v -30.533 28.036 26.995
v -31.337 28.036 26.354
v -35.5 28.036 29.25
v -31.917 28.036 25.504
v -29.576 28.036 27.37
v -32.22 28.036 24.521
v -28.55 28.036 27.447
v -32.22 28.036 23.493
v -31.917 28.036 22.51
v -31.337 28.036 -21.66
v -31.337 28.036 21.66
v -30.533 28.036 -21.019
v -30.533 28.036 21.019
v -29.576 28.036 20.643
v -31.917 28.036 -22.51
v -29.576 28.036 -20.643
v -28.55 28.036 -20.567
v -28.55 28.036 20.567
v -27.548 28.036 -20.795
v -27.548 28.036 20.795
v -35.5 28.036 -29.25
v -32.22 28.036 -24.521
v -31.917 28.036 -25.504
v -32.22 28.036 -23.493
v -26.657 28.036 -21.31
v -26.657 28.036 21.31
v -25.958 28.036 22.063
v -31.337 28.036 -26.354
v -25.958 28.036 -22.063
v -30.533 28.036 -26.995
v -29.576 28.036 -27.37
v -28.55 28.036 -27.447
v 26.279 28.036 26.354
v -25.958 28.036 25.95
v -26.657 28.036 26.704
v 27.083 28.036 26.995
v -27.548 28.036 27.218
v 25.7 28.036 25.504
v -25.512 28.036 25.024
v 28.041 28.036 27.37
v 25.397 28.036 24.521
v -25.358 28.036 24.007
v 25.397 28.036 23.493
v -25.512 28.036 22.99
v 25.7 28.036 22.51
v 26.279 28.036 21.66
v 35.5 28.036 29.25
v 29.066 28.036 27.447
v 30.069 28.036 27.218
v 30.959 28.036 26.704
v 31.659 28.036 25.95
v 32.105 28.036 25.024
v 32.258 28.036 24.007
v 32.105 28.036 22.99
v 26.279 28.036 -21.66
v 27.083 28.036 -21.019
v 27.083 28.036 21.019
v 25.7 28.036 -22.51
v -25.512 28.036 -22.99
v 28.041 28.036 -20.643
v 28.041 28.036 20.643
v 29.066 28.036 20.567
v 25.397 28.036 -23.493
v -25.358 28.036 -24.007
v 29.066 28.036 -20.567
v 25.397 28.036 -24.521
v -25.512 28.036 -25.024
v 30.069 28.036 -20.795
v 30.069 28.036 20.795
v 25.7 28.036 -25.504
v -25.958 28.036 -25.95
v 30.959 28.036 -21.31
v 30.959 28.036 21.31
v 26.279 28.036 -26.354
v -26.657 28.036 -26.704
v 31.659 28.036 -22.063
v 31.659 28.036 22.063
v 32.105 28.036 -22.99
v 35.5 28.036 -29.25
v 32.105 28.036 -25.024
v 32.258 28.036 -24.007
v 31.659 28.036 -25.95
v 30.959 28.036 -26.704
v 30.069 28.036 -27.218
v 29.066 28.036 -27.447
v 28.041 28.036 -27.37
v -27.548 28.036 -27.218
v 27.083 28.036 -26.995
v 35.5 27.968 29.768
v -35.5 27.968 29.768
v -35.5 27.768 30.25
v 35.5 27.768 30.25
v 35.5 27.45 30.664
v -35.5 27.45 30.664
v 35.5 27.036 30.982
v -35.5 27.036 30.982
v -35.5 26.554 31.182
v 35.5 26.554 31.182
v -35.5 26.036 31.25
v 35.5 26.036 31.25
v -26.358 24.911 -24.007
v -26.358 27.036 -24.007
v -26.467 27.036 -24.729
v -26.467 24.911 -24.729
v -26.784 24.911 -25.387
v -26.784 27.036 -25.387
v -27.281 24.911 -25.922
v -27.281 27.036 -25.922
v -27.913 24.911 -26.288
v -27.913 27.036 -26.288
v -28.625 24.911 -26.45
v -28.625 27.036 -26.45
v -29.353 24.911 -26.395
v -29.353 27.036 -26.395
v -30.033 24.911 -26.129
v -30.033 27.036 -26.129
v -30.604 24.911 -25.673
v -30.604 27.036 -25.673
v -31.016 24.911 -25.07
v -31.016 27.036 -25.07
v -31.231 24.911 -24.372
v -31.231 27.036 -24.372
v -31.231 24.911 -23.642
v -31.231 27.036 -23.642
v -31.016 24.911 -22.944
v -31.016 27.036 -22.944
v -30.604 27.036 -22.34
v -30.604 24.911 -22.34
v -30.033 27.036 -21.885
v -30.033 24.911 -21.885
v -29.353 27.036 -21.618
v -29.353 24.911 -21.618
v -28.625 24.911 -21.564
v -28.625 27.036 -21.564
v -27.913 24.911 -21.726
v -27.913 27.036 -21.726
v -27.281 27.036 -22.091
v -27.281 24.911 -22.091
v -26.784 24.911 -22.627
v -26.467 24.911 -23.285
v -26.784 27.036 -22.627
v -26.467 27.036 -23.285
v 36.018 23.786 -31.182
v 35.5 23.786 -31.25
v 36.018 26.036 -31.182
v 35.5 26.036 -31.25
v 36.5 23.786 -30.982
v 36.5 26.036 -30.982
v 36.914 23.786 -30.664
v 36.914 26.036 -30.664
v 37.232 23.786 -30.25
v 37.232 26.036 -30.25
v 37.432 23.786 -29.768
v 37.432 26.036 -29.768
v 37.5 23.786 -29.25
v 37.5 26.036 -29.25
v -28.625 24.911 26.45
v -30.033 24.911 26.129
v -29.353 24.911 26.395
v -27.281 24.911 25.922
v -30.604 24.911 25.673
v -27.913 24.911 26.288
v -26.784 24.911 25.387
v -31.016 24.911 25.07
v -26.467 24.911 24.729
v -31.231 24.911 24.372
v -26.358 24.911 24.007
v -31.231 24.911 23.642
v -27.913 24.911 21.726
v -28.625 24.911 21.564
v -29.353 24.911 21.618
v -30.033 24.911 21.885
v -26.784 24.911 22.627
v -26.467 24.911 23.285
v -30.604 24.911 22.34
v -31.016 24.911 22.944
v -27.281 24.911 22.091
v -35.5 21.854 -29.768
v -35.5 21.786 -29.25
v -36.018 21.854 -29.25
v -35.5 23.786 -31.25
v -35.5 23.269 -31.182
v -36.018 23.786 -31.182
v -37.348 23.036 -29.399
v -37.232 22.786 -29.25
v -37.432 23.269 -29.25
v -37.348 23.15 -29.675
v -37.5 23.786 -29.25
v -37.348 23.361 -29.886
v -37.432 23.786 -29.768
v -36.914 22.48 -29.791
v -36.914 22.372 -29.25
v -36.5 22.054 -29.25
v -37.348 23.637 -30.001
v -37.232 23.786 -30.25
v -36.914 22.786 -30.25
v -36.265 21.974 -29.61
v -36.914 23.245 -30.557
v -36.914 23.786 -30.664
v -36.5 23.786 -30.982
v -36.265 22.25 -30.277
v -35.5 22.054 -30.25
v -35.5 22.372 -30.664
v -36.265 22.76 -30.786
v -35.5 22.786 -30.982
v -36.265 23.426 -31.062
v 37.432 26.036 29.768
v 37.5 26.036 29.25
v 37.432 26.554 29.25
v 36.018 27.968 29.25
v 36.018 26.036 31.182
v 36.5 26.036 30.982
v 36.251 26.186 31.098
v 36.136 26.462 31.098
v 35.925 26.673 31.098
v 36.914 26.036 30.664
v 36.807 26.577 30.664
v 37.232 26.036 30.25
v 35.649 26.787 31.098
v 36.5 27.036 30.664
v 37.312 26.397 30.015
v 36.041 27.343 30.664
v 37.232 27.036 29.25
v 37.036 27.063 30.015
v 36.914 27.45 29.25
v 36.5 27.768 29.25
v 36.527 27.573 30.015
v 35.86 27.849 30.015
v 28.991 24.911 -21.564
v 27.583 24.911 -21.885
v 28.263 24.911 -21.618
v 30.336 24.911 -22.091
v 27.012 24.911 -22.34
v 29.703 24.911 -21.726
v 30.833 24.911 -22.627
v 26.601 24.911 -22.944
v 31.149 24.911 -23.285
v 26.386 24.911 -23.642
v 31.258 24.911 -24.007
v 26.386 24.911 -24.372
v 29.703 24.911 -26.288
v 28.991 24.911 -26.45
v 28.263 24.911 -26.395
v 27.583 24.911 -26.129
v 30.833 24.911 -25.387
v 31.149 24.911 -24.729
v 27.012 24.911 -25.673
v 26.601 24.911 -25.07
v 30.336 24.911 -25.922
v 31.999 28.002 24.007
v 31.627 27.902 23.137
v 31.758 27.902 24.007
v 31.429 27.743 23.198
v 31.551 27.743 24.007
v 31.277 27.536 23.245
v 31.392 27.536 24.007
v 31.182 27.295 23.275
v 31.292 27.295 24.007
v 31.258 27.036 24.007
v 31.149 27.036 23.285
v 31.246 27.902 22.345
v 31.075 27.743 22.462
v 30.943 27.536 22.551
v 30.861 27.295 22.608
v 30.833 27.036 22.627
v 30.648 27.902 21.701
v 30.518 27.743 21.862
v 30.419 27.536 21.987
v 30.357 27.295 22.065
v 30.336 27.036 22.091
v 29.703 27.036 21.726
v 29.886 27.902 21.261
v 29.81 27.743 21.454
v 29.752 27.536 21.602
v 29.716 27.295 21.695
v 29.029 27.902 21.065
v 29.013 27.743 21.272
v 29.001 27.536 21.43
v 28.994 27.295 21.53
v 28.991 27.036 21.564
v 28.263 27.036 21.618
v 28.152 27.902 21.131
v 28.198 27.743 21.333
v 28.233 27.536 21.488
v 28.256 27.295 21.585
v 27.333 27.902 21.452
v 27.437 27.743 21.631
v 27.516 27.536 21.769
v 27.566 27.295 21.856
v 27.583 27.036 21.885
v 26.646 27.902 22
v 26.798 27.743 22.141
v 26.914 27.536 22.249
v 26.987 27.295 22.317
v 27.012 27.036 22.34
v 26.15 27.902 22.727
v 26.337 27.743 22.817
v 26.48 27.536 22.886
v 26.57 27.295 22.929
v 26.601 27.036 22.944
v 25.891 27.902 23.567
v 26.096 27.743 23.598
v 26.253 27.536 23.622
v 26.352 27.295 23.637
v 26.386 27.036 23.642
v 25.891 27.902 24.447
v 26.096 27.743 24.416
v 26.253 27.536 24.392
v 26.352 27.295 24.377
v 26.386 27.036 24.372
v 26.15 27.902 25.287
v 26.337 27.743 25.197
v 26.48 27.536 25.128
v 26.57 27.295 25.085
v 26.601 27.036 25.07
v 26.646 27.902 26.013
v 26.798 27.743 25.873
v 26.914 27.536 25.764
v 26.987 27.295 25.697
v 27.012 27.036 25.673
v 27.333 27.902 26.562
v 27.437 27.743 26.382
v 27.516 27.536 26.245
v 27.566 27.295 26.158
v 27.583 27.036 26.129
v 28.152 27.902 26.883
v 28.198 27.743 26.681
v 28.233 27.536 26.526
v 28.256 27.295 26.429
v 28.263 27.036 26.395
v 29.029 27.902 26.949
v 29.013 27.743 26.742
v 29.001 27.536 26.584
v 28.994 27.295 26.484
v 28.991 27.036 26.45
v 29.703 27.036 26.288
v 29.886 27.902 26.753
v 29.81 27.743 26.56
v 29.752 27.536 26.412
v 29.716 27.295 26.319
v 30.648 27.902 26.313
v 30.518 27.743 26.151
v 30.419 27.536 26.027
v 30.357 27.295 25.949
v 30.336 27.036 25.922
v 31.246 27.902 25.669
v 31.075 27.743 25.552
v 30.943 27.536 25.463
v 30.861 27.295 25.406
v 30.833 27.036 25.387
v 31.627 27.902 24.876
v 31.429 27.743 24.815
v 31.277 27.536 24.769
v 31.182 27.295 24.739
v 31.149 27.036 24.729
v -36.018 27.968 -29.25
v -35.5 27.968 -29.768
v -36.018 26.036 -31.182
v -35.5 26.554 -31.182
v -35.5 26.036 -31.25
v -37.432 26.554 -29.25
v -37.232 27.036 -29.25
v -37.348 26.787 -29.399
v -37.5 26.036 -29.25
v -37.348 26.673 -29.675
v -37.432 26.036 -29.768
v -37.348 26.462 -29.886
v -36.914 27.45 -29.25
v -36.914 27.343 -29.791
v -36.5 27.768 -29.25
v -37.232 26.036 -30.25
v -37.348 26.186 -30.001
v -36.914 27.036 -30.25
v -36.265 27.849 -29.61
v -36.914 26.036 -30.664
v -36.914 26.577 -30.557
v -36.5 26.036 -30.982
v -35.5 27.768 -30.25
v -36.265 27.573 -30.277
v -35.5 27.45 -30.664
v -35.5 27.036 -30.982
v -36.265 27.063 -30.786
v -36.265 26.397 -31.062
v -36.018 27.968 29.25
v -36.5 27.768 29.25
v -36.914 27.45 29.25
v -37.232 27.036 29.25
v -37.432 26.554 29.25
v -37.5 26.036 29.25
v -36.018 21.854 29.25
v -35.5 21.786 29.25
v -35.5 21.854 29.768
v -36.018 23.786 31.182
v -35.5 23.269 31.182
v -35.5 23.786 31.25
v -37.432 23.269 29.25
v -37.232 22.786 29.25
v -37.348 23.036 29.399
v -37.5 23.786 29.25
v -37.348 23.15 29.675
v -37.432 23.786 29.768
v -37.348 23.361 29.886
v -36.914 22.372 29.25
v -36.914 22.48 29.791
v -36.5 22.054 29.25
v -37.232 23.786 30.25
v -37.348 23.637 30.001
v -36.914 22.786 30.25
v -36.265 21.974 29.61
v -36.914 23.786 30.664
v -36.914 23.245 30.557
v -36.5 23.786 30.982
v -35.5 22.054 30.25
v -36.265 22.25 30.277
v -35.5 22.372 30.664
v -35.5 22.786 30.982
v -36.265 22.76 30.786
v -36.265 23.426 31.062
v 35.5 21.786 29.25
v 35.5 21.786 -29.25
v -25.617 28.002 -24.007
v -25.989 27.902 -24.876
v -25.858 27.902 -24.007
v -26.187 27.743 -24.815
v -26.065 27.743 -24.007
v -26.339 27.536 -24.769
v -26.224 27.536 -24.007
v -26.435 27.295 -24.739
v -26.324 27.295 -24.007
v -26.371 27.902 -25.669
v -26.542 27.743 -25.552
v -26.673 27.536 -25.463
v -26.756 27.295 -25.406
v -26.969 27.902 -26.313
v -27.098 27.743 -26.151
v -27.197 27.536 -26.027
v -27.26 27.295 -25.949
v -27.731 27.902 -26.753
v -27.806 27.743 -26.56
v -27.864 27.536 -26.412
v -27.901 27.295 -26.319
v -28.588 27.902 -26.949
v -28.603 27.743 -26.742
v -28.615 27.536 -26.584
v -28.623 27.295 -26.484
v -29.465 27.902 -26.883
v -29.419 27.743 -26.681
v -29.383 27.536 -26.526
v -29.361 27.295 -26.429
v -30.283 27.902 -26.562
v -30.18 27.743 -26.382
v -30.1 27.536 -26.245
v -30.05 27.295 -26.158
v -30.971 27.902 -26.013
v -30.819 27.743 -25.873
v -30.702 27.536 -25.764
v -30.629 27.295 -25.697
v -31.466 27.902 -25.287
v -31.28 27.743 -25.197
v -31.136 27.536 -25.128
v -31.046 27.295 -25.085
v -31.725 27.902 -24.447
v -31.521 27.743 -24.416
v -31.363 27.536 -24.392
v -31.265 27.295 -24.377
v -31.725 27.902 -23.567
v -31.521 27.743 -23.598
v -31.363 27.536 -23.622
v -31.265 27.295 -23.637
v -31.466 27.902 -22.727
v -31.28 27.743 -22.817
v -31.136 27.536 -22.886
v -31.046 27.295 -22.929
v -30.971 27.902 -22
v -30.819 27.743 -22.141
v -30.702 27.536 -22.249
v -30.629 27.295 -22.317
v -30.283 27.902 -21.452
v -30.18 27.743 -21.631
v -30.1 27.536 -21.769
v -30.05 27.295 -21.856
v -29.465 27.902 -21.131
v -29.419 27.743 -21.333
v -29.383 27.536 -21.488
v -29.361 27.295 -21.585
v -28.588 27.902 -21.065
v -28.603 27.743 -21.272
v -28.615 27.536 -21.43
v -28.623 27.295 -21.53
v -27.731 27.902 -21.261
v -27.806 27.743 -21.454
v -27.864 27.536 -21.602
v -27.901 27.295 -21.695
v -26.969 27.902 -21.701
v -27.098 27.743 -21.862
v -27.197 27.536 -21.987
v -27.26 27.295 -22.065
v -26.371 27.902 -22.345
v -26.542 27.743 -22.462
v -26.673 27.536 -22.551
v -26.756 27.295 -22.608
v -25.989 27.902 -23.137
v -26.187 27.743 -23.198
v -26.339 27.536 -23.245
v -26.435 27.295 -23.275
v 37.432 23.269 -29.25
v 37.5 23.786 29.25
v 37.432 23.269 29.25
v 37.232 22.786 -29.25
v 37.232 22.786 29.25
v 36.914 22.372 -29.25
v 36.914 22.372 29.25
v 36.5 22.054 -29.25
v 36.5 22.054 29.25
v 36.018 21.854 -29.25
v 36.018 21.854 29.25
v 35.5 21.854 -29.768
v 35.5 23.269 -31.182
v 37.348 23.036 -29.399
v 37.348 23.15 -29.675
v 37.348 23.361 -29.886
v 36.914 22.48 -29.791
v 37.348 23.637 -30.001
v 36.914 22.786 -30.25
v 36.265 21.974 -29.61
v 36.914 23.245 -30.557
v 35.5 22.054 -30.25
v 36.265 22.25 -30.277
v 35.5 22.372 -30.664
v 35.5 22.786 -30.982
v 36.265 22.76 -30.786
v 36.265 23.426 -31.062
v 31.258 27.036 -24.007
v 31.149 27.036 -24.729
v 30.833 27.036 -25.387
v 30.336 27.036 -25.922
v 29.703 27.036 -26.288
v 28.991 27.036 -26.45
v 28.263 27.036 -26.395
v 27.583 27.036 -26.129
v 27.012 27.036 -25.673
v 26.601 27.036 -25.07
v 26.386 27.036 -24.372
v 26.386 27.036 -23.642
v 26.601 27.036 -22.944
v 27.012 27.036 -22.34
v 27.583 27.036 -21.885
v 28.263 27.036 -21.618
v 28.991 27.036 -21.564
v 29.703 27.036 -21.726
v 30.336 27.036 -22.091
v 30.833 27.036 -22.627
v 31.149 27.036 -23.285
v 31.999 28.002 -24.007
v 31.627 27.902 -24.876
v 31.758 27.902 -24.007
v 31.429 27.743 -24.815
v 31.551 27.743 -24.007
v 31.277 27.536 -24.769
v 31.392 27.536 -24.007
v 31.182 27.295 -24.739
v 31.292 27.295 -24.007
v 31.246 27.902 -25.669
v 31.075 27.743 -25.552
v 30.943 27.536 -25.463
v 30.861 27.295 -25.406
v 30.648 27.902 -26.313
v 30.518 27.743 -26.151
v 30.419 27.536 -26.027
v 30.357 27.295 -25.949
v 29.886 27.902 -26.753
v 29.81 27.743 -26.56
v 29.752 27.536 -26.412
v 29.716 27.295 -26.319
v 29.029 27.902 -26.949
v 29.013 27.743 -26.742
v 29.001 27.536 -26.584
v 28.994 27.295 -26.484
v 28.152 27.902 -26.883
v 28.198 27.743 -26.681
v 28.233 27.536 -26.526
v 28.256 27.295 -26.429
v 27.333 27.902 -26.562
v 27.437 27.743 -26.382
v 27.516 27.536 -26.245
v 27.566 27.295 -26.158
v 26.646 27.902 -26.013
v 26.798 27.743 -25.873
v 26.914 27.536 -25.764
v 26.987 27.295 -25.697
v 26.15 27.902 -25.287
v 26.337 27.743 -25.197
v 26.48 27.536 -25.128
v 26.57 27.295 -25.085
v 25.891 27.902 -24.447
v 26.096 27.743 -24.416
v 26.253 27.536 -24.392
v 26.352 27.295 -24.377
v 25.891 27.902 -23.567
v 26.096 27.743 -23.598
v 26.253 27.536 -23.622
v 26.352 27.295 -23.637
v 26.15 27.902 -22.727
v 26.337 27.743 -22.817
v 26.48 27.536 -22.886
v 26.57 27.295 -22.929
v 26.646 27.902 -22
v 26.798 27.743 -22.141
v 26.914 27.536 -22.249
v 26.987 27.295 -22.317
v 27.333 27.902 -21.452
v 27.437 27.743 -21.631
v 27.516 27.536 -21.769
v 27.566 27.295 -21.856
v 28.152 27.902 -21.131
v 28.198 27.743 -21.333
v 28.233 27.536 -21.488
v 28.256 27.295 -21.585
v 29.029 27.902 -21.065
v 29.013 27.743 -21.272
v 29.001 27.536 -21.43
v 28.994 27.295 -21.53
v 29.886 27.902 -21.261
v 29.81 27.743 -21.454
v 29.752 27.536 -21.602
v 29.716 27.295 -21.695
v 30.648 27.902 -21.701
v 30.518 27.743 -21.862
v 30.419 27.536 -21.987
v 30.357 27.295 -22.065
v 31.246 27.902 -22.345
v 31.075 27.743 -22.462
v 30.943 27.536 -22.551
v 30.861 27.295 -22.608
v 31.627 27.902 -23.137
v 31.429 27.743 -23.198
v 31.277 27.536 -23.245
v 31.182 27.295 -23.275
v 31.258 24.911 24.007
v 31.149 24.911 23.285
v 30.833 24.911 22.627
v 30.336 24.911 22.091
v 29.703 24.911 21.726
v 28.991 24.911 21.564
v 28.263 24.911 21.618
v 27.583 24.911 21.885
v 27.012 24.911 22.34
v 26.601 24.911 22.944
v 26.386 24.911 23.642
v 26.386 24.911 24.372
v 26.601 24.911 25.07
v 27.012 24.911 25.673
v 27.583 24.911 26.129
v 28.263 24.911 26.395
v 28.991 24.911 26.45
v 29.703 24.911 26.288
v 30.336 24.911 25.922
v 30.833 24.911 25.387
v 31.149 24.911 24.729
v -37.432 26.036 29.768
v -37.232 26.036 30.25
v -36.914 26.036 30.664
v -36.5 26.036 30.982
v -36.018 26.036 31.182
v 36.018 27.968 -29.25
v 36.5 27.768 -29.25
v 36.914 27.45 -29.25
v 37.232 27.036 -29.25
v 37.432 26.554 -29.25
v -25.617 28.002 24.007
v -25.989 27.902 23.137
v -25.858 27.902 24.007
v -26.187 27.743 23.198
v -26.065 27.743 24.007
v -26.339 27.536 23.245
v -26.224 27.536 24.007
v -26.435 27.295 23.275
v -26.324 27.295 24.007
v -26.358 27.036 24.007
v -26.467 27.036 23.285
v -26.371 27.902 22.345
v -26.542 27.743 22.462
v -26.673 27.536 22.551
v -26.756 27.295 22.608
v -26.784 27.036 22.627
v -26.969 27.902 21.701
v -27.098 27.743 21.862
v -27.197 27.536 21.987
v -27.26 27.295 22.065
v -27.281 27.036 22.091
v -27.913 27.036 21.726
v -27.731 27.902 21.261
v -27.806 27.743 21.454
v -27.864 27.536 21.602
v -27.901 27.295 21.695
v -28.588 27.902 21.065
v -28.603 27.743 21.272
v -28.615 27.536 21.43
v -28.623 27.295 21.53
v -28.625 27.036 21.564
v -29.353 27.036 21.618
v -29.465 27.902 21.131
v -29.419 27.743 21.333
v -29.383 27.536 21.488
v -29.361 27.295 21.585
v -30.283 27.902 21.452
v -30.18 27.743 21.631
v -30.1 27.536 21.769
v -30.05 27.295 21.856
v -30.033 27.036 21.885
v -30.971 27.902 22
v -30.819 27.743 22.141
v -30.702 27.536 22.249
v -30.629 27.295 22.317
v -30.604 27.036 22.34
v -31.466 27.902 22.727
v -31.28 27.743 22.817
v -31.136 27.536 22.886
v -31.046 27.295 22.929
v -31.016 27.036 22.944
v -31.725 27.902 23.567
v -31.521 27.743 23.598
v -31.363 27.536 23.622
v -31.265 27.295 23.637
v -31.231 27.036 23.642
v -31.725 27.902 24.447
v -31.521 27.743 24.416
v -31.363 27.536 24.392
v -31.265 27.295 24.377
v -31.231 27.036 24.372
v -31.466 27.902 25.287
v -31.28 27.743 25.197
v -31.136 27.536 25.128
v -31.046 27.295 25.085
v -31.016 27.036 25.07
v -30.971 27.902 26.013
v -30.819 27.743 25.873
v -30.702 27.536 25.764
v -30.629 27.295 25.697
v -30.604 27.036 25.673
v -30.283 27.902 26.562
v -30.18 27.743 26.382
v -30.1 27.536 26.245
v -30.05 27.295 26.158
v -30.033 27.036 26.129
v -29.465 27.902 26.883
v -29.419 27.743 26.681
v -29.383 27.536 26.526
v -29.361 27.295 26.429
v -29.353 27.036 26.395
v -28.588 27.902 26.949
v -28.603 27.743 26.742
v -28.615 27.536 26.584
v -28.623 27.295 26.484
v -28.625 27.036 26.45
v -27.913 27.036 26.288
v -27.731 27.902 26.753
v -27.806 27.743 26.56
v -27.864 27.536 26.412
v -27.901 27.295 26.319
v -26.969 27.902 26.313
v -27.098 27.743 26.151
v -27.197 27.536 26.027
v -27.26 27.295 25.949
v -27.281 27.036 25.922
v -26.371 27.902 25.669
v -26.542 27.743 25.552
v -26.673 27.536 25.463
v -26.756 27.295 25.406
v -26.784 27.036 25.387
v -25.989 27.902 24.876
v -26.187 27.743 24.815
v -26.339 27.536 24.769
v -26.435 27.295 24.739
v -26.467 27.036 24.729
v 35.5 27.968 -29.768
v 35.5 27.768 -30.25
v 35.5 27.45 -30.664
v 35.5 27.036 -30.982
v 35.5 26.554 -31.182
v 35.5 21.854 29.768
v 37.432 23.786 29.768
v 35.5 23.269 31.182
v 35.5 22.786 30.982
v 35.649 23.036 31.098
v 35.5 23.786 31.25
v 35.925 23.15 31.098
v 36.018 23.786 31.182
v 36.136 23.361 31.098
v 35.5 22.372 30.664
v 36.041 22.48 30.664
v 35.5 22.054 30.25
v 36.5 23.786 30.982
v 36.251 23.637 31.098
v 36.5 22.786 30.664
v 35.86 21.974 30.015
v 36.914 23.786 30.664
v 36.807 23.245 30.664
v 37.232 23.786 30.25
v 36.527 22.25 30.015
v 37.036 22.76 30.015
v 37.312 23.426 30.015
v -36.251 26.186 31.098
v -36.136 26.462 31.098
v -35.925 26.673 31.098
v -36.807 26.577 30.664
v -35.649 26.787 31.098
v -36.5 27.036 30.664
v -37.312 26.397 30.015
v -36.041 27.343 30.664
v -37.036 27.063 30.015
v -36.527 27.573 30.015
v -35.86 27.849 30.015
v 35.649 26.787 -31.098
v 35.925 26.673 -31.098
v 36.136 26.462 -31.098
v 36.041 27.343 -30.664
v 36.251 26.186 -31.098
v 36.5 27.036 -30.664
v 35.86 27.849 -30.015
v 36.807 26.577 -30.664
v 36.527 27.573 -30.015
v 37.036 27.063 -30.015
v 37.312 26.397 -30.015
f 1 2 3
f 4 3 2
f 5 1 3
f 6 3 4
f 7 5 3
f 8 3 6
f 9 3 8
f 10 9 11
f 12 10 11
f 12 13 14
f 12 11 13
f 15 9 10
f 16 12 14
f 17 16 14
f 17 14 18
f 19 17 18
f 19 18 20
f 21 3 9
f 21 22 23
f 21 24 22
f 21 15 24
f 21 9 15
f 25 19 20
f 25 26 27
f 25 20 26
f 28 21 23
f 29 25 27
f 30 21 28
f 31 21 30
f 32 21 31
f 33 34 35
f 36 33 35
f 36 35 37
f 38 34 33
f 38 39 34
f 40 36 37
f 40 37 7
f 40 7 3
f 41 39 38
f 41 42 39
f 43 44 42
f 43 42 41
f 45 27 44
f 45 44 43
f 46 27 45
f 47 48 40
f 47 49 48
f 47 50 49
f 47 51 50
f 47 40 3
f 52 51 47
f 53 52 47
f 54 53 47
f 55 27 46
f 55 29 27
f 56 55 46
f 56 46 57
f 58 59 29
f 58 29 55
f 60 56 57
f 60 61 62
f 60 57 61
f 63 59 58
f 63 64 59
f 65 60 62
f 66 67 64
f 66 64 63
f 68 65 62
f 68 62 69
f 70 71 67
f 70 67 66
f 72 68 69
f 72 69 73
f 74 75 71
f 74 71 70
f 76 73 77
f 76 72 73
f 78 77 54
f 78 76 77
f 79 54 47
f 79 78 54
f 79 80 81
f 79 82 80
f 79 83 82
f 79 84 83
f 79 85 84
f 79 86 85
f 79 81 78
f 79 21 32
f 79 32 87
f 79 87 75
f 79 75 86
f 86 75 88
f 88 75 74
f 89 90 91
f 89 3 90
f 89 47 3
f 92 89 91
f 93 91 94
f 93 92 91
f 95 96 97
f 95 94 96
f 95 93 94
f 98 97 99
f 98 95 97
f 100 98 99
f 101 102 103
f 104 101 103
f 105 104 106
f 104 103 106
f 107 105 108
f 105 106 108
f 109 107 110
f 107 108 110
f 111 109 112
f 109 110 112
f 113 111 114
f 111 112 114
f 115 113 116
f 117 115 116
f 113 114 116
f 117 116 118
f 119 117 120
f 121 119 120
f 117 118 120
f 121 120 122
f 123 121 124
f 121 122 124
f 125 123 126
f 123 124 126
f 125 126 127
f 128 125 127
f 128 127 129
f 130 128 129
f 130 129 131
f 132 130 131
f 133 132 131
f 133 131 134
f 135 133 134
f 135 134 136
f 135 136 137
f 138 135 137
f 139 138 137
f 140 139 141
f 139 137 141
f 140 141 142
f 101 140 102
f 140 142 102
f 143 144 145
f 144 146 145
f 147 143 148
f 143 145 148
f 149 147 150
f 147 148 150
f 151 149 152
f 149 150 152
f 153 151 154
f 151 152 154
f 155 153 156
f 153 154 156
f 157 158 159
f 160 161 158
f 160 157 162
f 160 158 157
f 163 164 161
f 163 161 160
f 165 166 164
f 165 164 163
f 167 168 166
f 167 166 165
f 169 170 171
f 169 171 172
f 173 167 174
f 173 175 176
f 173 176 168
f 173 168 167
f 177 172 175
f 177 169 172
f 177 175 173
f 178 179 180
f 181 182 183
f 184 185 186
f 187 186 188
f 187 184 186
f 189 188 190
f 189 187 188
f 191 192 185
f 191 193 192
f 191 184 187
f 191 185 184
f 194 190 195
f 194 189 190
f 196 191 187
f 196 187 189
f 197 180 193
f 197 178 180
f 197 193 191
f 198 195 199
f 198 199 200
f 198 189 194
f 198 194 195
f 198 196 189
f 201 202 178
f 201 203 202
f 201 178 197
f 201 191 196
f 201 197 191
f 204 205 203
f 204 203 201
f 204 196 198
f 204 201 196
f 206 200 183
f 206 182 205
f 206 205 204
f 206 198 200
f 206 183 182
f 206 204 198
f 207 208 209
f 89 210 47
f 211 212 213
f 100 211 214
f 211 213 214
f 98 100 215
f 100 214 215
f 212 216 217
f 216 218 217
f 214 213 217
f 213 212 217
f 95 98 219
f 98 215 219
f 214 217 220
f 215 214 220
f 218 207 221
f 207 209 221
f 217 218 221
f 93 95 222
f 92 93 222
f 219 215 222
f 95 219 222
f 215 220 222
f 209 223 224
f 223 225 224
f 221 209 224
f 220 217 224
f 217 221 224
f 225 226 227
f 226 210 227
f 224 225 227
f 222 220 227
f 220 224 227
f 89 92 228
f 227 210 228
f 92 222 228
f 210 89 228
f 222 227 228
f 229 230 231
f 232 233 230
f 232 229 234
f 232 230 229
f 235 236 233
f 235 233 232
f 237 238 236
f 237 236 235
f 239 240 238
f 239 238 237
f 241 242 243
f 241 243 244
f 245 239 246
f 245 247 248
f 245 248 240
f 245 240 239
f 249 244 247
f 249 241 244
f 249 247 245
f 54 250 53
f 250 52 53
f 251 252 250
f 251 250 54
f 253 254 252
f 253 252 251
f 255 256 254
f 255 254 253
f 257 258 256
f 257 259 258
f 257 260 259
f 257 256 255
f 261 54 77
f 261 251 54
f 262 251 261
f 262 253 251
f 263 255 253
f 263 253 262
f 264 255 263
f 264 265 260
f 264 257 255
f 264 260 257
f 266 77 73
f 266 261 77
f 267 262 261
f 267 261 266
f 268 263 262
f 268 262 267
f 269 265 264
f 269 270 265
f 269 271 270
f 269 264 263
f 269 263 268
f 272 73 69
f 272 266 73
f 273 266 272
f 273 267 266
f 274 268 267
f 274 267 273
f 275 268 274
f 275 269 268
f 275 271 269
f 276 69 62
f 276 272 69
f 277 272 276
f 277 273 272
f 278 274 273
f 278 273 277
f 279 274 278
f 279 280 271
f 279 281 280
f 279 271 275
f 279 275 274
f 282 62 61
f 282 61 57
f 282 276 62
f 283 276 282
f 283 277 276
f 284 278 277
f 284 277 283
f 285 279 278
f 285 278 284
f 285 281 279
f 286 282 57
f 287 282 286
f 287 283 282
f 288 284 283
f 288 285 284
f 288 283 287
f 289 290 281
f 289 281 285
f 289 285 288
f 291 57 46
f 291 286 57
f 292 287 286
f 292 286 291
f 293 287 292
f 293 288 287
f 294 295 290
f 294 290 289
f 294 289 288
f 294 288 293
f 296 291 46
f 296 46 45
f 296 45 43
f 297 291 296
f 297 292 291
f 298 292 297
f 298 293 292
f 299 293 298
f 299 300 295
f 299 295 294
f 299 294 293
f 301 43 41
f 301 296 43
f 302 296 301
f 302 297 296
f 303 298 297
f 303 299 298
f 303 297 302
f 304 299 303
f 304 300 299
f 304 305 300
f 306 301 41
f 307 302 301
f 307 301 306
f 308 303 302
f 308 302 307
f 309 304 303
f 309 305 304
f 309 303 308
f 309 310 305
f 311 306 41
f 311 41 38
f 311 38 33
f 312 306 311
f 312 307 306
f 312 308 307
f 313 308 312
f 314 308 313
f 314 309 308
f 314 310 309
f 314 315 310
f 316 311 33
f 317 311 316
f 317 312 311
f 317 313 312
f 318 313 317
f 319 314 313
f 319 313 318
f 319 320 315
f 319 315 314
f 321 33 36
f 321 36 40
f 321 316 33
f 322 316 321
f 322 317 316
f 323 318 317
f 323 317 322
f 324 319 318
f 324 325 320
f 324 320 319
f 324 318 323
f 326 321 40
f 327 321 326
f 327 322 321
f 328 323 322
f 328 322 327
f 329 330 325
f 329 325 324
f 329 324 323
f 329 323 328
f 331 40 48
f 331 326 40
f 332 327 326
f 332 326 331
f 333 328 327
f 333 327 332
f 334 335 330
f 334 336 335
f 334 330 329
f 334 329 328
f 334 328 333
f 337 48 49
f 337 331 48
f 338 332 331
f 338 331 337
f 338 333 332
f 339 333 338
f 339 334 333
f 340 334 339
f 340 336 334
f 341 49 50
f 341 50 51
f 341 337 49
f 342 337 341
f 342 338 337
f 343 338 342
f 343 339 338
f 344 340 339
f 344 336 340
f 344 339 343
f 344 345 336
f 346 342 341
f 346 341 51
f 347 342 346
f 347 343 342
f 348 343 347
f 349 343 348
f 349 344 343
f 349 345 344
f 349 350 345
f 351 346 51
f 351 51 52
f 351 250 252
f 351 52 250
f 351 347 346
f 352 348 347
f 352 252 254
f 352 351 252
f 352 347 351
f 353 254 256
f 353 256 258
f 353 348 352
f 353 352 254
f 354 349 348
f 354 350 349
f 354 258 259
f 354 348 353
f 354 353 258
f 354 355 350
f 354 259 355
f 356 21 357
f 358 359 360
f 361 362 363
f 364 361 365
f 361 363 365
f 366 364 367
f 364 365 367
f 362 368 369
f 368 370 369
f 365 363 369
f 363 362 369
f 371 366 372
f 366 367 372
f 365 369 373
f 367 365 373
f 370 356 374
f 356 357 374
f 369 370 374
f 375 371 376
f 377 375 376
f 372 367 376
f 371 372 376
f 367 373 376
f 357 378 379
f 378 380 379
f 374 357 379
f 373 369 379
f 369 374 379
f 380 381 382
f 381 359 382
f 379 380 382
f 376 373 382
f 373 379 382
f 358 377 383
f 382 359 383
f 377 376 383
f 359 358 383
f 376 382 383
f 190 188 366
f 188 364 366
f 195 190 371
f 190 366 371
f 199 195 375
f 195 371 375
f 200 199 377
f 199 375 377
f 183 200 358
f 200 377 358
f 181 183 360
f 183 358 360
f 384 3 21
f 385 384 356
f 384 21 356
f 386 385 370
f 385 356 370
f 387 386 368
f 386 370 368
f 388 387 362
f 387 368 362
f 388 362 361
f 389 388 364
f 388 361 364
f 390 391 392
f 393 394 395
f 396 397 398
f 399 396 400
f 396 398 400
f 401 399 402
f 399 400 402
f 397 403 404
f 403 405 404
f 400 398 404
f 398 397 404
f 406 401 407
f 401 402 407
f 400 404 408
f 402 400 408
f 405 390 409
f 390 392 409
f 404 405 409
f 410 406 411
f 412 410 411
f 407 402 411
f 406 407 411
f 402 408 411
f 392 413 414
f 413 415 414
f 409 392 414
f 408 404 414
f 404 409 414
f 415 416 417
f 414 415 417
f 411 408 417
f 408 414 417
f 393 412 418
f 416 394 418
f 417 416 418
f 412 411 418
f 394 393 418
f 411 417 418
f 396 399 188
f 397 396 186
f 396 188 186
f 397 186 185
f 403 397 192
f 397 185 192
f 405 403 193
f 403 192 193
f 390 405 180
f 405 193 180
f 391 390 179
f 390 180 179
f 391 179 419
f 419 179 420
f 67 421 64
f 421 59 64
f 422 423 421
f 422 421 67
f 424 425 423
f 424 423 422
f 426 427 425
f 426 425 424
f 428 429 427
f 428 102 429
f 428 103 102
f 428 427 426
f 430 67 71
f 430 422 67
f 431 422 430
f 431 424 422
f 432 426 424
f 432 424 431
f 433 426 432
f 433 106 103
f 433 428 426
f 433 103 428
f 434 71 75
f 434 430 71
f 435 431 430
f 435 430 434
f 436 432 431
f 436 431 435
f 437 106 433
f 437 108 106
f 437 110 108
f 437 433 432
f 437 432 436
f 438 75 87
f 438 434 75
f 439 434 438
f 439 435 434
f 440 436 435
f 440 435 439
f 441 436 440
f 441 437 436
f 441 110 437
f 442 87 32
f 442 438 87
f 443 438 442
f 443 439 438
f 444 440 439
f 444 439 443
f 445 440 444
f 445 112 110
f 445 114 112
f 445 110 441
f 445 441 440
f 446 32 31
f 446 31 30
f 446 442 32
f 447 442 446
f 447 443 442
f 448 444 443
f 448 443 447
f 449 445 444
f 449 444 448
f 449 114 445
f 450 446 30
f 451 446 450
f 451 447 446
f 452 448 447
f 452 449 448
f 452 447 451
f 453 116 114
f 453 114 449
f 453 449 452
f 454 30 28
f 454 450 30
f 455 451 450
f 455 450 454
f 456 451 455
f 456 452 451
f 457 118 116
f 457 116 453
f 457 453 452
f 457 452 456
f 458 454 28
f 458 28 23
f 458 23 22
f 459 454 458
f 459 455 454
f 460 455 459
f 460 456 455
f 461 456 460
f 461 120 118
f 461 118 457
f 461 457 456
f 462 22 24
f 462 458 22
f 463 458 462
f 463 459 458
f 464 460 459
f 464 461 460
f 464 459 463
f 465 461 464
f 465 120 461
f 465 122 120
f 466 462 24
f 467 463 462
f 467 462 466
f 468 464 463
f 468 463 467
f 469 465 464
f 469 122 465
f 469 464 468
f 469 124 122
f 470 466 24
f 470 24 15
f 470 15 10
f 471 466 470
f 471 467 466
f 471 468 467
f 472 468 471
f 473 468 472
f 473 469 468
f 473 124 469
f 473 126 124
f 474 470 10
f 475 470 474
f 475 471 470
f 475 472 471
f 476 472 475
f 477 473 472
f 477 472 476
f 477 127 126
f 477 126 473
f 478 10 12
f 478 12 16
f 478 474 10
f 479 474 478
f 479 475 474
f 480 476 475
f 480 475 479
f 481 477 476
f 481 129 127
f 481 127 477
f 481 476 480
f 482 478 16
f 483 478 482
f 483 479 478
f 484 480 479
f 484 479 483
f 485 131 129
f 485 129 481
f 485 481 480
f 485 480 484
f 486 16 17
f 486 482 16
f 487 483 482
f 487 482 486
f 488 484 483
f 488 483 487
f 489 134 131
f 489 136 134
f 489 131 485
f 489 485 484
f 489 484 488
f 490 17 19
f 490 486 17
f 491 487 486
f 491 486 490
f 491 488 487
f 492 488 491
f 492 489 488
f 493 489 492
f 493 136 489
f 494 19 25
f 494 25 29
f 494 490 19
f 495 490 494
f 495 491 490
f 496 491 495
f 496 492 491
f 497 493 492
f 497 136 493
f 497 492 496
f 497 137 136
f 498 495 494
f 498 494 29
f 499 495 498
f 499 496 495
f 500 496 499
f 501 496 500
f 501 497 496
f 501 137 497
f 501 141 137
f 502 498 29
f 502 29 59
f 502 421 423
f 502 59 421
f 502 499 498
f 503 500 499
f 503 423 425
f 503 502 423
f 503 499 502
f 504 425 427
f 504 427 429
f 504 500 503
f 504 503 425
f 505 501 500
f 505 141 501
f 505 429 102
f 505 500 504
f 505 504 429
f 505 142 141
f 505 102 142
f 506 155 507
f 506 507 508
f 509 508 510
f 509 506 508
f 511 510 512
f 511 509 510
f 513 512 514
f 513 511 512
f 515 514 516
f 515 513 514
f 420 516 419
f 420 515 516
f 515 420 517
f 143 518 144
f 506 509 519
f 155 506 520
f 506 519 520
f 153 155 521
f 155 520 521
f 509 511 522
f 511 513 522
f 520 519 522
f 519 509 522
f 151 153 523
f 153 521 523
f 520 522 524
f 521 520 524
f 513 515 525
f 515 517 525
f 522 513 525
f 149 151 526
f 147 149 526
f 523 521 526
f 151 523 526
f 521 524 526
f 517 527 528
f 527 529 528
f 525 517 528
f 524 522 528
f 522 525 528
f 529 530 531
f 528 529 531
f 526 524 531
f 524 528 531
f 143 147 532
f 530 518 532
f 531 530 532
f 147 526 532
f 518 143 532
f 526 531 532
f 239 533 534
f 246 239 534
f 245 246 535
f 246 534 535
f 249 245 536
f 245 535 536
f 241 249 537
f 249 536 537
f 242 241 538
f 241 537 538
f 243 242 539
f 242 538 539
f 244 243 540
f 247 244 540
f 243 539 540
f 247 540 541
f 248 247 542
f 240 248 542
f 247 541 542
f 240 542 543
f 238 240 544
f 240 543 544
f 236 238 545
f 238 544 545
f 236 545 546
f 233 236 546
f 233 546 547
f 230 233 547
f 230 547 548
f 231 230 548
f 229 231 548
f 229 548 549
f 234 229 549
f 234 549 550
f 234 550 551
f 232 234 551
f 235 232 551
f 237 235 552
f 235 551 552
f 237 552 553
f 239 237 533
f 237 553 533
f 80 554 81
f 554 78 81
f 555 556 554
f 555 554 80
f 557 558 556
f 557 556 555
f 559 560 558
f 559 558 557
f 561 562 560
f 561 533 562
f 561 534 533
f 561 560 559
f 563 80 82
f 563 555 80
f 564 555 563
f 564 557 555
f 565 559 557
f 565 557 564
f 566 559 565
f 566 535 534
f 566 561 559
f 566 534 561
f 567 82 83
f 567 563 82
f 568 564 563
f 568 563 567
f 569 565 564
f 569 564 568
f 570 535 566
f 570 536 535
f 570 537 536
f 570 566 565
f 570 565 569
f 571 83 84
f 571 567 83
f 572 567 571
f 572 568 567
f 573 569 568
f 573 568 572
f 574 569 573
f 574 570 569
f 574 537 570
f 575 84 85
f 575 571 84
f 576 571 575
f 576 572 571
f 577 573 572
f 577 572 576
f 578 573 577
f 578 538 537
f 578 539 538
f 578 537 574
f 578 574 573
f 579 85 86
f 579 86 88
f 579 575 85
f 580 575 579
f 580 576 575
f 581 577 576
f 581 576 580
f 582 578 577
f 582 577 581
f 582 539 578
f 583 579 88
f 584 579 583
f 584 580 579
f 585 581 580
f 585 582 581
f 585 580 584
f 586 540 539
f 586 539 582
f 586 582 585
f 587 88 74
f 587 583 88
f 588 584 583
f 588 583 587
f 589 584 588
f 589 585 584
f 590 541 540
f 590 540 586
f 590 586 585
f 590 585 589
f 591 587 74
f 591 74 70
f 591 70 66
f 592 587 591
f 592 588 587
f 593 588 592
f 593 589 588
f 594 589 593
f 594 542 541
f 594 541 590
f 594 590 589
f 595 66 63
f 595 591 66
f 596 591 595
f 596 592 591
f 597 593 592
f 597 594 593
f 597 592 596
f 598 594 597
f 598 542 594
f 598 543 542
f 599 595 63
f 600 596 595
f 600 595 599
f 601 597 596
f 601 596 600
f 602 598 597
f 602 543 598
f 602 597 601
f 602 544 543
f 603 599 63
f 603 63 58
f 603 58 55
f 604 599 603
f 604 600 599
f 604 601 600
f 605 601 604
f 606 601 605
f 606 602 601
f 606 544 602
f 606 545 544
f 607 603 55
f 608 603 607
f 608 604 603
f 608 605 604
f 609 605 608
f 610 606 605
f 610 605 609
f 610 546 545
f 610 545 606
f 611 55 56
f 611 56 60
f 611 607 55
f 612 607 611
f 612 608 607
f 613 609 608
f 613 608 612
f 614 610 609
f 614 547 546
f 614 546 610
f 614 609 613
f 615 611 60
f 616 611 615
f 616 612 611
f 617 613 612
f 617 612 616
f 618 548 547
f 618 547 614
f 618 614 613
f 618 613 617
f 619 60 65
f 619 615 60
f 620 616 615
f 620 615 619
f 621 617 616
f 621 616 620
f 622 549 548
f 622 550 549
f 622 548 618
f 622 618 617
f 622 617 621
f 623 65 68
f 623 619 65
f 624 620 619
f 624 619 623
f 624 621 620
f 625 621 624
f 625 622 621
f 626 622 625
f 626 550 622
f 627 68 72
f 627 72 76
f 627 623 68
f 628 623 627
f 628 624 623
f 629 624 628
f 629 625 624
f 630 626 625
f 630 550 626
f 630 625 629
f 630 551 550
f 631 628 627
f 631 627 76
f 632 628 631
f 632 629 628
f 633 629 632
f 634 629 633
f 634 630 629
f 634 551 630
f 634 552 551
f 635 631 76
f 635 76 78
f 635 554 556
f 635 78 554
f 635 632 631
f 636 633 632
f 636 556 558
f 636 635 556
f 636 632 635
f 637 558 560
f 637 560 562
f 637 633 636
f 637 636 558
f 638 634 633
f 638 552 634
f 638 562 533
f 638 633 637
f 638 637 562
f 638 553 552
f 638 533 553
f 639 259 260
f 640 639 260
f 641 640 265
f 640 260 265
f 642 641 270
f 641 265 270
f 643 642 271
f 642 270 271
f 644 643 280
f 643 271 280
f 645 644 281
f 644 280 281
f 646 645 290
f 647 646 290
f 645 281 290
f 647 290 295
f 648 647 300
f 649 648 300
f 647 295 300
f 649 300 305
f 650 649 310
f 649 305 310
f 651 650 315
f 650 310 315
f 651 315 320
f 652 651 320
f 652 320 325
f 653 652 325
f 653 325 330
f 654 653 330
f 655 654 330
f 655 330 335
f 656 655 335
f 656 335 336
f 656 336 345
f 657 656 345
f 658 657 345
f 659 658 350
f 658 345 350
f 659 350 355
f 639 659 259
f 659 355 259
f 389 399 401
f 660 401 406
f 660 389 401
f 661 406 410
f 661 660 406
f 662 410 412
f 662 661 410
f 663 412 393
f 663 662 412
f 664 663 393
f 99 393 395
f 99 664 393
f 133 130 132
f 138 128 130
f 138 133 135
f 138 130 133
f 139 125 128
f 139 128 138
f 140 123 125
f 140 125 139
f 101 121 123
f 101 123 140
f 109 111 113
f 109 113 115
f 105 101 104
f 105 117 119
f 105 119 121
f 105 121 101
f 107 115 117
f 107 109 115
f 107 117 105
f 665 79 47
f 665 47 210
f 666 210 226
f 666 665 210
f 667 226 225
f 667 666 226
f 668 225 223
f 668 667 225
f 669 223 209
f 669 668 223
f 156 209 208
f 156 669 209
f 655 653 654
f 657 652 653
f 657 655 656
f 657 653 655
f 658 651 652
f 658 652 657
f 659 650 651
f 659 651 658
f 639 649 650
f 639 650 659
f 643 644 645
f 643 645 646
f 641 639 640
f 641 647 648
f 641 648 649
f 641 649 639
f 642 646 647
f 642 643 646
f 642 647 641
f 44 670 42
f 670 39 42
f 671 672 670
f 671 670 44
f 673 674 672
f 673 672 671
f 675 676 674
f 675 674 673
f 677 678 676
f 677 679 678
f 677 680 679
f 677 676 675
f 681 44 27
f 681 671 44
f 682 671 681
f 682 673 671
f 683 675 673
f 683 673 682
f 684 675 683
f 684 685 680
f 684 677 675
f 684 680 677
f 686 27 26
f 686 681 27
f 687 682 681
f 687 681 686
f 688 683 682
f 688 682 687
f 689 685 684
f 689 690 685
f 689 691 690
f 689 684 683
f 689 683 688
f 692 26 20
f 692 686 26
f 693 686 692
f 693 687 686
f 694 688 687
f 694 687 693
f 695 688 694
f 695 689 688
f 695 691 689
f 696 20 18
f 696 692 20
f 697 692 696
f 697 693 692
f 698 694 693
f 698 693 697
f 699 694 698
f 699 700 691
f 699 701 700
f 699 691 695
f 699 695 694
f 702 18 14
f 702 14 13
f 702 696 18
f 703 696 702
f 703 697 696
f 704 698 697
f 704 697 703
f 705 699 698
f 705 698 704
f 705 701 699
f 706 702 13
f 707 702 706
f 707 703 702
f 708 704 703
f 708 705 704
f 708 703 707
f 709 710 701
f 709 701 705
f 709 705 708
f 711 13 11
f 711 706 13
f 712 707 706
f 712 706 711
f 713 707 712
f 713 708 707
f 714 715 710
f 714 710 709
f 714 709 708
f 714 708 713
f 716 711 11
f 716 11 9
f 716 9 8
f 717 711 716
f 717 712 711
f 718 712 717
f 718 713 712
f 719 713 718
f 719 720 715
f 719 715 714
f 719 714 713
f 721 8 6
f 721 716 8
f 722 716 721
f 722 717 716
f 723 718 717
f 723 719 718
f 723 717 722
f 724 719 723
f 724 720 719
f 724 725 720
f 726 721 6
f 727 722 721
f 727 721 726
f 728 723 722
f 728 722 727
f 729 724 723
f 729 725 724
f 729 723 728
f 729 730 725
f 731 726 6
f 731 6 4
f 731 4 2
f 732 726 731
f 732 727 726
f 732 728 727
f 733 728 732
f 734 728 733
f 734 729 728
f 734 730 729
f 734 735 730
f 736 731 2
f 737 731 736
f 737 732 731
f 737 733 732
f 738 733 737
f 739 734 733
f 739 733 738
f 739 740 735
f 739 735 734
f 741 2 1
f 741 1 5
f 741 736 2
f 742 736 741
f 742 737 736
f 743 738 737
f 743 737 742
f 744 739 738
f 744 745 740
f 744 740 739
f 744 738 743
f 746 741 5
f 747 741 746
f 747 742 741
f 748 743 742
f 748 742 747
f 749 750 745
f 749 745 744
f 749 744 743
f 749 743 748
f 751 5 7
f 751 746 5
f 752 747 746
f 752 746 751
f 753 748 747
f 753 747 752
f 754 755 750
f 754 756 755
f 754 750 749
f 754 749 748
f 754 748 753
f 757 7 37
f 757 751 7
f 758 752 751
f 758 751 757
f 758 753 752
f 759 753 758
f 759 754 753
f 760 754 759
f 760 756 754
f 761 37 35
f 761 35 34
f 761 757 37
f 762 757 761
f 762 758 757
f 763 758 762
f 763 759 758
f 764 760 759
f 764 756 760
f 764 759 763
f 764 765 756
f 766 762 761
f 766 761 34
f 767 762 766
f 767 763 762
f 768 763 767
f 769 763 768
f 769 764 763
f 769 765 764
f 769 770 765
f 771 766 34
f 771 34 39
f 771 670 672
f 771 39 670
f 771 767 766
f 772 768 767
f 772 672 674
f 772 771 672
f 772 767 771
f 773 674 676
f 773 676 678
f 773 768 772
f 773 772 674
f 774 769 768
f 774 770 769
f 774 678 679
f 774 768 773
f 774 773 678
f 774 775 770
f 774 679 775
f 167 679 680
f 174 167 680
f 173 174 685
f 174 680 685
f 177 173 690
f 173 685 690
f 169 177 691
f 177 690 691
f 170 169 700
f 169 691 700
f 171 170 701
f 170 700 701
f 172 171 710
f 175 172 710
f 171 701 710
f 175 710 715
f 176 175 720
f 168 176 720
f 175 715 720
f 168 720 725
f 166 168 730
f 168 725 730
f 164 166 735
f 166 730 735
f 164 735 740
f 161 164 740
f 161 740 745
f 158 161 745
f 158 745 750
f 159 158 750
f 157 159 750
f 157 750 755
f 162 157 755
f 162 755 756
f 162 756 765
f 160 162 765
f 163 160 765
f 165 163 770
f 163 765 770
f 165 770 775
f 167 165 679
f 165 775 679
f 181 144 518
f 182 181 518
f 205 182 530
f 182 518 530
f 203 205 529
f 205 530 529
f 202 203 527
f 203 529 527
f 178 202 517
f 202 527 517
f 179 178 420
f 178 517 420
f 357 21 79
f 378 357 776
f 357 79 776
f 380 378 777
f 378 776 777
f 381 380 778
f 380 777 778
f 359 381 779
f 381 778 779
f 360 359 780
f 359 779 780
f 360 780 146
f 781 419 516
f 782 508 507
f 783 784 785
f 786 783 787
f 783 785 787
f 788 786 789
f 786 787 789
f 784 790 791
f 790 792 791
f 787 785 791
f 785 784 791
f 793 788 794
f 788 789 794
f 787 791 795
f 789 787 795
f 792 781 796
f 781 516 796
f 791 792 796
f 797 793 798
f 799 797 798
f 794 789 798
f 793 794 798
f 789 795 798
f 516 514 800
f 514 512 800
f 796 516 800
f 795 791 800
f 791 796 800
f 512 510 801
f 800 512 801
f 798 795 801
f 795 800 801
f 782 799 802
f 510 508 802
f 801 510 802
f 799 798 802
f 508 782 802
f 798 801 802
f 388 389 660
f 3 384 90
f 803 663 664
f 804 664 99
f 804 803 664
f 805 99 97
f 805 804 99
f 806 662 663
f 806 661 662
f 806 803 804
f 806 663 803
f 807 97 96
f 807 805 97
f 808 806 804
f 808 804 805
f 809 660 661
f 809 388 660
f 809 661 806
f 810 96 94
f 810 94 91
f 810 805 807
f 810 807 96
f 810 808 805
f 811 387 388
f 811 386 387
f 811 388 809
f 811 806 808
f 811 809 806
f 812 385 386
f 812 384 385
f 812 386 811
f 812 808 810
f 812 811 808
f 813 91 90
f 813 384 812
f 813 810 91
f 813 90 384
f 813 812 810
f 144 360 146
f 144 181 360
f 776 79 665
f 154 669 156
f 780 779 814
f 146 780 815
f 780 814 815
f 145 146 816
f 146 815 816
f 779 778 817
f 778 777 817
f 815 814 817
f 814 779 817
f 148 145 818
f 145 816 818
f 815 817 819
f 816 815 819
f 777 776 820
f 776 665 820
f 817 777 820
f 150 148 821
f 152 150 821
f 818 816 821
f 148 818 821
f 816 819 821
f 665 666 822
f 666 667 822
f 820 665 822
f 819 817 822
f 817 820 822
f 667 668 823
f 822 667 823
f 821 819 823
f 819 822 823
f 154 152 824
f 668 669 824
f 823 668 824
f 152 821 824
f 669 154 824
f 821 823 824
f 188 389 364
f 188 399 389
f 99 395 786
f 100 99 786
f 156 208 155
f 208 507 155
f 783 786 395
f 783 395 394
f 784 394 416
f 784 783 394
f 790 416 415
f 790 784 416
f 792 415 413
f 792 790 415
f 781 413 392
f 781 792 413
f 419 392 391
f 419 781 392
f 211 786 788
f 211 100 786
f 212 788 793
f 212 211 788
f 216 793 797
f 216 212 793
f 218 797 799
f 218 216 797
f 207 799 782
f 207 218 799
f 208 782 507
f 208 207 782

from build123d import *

# Parameters (mm, degrees)
SKETCH1_W           = 600
SKETCH1_H           = 500
BOSS_EXTRUDE1_DEPTH = 50
SKETCH2_R           = 19.6
CUT_EXTRUDE1_DEPTH  = 25
SCALE1_SCALE        = 0.125
FILLET4_R           = 1
FILLET7_R           = 2


with BuildPart() as part:
    # Sketch1 → Boss-Extrude1 (new body)
    with BuildSketch(Plane(origin=(0, 0, 0), x_dir=(1, 0, 0), z_dir=(0, 1, 0))):
        Rectangle(SKETCH1_W, SKETCH1_H)
    extrude(amount=BOSS_EXTRUDE1_DEPTH)

    # Sketch2 → Cut-Extrude1 (cut)
    with BuildSketch(Plane(origin=(0, 50, 0), x_dir=(1, 0, 0), z_dir=(0, 1, 0))):
        with Locations((-230.466383879, -192.055319899)):
            Circle(SKETCH2_R)
        with Locations((230.466383879, 192.055319899)):
            Circle(SKETCH2_R)
        with Locations((230.466383879, -192.055319899)):
            Circle(SKETCH2_R)
        with Locations((-230.466383879, 192.055319899)):
            Circle(SKETCH2_R)
    extrude(amount=-CUT_EXTRUDE1_DEPTH, mode=Mode.SUBTRACT)


with BuildPart() as part_1:
    # Scale1: scaled about (0, 24.898611392, 0)
    add(part.part.scale(SCALE1_SCALE).moved(Location((0, 21.786284968, 0))))

    # Fillet4
    fillet4_edges = [part_1.edges().sort_by_distance(p)[0] for p in [
        (-31.258297985, 28.036284968, -24.006914987),
        (26.358297985, 28.036284968, 24.006914987),
        (26.358297985, 28.036284968, -24.006914987),
        (-31.258297985, 28.036284968, 24.006914987),
    ]]
    fillet(fillet4_edges, radius=FILLET4_R)

    # Fillet7
    fillet7_edges = [part_1.edges().sort_by_distance(p)[0] for p in [
        (37.5, 28.036284968, 0),
        (0, 28.036284968, -31.25),
        (-37.5, 28.036284968, 0),
        (0, 21.786284968, -31.25),
        (37.5, 21.786284968, 0),
        (0, 21.786284968, 31.25),
        (-37.5, 21.786284968, 0),
        (-37.5, 24.911284968, -31.25),
        (37.5, 24.911284968, -31.25),
        (37.5, 24.911284968, 31.25),
        (-37.5, 24.911284968, 31.25),
        (0, 28.036284968, 31.25),
    ]]
    fillet(fillet7_edges, radius=FILLET7_R)


solid = part_1.part
